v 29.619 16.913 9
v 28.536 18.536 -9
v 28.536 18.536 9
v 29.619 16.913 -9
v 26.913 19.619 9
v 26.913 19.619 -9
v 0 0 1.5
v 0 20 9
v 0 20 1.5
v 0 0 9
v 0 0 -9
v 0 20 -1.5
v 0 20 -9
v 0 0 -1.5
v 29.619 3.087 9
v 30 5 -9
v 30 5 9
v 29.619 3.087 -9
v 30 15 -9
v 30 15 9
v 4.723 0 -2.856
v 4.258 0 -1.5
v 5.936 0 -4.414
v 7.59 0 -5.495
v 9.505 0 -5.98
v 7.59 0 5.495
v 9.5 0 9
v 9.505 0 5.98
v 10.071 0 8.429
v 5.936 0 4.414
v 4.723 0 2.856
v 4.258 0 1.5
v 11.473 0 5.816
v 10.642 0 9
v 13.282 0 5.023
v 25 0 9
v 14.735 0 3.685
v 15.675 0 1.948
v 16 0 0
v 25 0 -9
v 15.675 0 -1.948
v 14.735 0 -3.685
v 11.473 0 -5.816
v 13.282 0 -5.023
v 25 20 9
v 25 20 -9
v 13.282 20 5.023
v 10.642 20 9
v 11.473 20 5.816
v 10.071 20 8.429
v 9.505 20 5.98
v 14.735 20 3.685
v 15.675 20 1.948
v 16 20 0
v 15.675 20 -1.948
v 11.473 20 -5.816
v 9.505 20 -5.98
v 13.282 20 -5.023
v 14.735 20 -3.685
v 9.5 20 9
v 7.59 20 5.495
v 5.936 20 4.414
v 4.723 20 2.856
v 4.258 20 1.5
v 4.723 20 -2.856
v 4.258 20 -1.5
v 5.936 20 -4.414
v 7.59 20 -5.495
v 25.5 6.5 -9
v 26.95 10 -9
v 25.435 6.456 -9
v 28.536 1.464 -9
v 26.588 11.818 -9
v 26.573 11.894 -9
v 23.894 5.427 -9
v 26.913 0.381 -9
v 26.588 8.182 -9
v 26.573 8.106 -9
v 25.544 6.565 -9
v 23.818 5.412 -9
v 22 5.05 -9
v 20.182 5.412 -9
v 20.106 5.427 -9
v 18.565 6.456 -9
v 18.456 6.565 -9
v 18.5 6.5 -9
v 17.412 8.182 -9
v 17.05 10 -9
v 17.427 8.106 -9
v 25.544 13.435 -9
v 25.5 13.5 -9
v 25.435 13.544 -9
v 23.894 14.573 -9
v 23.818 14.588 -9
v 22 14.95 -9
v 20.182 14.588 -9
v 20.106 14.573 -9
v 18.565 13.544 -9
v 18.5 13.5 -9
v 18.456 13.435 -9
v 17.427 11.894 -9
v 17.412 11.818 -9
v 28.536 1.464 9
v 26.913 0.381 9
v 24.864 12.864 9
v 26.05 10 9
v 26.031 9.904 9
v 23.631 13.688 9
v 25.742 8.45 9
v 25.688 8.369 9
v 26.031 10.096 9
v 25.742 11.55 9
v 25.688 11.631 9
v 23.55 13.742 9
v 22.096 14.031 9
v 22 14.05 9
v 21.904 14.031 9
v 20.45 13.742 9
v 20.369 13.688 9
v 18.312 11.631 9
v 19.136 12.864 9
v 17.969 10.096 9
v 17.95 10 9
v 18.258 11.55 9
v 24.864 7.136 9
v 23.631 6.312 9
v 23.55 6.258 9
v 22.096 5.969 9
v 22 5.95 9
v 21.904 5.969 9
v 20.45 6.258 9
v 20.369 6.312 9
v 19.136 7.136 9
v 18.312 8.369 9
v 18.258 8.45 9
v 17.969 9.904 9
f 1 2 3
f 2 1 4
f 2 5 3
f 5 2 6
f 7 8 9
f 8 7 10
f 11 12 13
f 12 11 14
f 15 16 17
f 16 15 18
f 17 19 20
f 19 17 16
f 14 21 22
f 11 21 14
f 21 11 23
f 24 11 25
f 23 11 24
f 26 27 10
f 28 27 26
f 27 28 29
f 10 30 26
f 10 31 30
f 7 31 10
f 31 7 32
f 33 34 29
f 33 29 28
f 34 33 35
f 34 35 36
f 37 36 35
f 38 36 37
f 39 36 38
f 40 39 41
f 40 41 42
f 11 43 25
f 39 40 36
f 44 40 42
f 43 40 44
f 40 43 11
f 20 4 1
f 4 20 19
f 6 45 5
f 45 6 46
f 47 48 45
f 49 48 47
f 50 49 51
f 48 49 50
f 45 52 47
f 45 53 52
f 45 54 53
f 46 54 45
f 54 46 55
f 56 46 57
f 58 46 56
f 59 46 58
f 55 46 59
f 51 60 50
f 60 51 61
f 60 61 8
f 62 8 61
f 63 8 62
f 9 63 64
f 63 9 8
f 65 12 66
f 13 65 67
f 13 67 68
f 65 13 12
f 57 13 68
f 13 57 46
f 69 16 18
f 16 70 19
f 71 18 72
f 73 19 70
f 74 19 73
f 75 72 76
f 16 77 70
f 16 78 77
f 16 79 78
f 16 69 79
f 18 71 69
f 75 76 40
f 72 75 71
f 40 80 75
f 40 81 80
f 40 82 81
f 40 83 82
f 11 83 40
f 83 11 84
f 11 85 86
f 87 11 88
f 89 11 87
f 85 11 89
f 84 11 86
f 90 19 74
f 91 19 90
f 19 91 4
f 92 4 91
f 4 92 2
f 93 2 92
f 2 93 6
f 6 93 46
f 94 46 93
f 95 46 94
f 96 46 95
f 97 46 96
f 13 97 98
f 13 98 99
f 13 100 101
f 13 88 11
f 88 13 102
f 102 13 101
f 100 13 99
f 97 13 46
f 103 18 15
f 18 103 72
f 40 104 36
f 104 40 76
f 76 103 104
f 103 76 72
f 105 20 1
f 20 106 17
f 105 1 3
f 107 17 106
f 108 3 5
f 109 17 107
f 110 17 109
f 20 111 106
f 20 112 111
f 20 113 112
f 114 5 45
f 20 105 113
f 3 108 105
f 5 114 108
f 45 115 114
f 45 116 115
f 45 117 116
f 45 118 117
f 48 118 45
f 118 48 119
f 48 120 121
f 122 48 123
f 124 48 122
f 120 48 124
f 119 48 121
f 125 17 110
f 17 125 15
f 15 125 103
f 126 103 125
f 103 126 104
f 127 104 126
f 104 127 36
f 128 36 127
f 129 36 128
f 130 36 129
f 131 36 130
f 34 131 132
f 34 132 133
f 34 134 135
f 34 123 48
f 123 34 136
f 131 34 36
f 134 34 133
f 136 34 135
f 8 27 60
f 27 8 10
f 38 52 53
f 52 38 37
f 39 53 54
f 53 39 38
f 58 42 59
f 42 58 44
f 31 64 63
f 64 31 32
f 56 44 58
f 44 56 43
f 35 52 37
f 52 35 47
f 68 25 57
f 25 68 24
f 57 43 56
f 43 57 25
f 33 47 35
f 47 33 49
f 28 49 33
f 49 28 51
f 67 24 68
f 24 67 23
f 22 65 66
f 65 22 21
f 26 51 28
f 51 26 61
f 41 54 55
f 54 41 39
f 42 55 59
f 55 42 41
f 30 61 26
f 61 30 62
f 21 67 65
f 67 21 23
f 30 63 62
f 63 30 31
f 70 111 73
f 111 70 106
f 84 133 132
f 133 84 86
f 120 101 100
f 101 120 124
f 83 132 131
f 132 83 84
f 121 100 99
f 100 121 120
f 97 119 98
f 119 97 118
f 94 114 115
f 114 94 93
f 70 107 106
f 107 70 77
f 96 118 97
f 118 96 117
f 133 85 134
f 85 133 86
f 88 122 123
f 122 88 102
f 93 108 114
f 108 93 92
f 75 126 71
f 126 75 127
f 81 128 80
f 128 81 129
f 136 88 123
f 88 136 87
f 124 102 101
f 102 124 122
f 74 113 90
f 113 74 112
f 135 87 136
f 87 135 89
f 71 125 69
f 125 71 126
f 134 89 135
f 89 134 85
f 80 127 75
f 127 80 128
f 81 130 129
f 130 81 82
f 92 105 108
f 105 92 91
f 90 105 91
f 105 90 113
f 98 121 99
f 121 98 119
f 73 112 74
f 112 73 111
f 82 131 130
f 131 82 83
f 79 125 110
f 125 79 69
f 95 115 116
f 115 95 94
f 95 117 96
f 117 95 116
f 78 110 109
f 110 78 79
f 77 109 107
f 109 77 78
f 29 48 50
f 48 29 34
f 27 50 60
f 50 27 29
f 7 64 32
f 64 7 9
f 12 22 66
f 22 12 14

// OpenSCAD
// laser holder
difference(){
	linear_extrude(height = 18, center = true, convexity = 14, twist = 0)hull(){
		square([10,20]);
		translate([25,5,0]) circle(5);
		translate([25,15,0]) circle(5);
	}
	translate([10,25,0])rotate([90,0,0])cylinder(30,6,6);
	translate([22,10,-10]) cylinder(20,5,4);
	color("red")translate([3,-5,15.5]) rotate([0,45,0]) cube([10,30,10]);
	color("red")translate([0,-1,-1.5])cube([5,22,3]);
}
